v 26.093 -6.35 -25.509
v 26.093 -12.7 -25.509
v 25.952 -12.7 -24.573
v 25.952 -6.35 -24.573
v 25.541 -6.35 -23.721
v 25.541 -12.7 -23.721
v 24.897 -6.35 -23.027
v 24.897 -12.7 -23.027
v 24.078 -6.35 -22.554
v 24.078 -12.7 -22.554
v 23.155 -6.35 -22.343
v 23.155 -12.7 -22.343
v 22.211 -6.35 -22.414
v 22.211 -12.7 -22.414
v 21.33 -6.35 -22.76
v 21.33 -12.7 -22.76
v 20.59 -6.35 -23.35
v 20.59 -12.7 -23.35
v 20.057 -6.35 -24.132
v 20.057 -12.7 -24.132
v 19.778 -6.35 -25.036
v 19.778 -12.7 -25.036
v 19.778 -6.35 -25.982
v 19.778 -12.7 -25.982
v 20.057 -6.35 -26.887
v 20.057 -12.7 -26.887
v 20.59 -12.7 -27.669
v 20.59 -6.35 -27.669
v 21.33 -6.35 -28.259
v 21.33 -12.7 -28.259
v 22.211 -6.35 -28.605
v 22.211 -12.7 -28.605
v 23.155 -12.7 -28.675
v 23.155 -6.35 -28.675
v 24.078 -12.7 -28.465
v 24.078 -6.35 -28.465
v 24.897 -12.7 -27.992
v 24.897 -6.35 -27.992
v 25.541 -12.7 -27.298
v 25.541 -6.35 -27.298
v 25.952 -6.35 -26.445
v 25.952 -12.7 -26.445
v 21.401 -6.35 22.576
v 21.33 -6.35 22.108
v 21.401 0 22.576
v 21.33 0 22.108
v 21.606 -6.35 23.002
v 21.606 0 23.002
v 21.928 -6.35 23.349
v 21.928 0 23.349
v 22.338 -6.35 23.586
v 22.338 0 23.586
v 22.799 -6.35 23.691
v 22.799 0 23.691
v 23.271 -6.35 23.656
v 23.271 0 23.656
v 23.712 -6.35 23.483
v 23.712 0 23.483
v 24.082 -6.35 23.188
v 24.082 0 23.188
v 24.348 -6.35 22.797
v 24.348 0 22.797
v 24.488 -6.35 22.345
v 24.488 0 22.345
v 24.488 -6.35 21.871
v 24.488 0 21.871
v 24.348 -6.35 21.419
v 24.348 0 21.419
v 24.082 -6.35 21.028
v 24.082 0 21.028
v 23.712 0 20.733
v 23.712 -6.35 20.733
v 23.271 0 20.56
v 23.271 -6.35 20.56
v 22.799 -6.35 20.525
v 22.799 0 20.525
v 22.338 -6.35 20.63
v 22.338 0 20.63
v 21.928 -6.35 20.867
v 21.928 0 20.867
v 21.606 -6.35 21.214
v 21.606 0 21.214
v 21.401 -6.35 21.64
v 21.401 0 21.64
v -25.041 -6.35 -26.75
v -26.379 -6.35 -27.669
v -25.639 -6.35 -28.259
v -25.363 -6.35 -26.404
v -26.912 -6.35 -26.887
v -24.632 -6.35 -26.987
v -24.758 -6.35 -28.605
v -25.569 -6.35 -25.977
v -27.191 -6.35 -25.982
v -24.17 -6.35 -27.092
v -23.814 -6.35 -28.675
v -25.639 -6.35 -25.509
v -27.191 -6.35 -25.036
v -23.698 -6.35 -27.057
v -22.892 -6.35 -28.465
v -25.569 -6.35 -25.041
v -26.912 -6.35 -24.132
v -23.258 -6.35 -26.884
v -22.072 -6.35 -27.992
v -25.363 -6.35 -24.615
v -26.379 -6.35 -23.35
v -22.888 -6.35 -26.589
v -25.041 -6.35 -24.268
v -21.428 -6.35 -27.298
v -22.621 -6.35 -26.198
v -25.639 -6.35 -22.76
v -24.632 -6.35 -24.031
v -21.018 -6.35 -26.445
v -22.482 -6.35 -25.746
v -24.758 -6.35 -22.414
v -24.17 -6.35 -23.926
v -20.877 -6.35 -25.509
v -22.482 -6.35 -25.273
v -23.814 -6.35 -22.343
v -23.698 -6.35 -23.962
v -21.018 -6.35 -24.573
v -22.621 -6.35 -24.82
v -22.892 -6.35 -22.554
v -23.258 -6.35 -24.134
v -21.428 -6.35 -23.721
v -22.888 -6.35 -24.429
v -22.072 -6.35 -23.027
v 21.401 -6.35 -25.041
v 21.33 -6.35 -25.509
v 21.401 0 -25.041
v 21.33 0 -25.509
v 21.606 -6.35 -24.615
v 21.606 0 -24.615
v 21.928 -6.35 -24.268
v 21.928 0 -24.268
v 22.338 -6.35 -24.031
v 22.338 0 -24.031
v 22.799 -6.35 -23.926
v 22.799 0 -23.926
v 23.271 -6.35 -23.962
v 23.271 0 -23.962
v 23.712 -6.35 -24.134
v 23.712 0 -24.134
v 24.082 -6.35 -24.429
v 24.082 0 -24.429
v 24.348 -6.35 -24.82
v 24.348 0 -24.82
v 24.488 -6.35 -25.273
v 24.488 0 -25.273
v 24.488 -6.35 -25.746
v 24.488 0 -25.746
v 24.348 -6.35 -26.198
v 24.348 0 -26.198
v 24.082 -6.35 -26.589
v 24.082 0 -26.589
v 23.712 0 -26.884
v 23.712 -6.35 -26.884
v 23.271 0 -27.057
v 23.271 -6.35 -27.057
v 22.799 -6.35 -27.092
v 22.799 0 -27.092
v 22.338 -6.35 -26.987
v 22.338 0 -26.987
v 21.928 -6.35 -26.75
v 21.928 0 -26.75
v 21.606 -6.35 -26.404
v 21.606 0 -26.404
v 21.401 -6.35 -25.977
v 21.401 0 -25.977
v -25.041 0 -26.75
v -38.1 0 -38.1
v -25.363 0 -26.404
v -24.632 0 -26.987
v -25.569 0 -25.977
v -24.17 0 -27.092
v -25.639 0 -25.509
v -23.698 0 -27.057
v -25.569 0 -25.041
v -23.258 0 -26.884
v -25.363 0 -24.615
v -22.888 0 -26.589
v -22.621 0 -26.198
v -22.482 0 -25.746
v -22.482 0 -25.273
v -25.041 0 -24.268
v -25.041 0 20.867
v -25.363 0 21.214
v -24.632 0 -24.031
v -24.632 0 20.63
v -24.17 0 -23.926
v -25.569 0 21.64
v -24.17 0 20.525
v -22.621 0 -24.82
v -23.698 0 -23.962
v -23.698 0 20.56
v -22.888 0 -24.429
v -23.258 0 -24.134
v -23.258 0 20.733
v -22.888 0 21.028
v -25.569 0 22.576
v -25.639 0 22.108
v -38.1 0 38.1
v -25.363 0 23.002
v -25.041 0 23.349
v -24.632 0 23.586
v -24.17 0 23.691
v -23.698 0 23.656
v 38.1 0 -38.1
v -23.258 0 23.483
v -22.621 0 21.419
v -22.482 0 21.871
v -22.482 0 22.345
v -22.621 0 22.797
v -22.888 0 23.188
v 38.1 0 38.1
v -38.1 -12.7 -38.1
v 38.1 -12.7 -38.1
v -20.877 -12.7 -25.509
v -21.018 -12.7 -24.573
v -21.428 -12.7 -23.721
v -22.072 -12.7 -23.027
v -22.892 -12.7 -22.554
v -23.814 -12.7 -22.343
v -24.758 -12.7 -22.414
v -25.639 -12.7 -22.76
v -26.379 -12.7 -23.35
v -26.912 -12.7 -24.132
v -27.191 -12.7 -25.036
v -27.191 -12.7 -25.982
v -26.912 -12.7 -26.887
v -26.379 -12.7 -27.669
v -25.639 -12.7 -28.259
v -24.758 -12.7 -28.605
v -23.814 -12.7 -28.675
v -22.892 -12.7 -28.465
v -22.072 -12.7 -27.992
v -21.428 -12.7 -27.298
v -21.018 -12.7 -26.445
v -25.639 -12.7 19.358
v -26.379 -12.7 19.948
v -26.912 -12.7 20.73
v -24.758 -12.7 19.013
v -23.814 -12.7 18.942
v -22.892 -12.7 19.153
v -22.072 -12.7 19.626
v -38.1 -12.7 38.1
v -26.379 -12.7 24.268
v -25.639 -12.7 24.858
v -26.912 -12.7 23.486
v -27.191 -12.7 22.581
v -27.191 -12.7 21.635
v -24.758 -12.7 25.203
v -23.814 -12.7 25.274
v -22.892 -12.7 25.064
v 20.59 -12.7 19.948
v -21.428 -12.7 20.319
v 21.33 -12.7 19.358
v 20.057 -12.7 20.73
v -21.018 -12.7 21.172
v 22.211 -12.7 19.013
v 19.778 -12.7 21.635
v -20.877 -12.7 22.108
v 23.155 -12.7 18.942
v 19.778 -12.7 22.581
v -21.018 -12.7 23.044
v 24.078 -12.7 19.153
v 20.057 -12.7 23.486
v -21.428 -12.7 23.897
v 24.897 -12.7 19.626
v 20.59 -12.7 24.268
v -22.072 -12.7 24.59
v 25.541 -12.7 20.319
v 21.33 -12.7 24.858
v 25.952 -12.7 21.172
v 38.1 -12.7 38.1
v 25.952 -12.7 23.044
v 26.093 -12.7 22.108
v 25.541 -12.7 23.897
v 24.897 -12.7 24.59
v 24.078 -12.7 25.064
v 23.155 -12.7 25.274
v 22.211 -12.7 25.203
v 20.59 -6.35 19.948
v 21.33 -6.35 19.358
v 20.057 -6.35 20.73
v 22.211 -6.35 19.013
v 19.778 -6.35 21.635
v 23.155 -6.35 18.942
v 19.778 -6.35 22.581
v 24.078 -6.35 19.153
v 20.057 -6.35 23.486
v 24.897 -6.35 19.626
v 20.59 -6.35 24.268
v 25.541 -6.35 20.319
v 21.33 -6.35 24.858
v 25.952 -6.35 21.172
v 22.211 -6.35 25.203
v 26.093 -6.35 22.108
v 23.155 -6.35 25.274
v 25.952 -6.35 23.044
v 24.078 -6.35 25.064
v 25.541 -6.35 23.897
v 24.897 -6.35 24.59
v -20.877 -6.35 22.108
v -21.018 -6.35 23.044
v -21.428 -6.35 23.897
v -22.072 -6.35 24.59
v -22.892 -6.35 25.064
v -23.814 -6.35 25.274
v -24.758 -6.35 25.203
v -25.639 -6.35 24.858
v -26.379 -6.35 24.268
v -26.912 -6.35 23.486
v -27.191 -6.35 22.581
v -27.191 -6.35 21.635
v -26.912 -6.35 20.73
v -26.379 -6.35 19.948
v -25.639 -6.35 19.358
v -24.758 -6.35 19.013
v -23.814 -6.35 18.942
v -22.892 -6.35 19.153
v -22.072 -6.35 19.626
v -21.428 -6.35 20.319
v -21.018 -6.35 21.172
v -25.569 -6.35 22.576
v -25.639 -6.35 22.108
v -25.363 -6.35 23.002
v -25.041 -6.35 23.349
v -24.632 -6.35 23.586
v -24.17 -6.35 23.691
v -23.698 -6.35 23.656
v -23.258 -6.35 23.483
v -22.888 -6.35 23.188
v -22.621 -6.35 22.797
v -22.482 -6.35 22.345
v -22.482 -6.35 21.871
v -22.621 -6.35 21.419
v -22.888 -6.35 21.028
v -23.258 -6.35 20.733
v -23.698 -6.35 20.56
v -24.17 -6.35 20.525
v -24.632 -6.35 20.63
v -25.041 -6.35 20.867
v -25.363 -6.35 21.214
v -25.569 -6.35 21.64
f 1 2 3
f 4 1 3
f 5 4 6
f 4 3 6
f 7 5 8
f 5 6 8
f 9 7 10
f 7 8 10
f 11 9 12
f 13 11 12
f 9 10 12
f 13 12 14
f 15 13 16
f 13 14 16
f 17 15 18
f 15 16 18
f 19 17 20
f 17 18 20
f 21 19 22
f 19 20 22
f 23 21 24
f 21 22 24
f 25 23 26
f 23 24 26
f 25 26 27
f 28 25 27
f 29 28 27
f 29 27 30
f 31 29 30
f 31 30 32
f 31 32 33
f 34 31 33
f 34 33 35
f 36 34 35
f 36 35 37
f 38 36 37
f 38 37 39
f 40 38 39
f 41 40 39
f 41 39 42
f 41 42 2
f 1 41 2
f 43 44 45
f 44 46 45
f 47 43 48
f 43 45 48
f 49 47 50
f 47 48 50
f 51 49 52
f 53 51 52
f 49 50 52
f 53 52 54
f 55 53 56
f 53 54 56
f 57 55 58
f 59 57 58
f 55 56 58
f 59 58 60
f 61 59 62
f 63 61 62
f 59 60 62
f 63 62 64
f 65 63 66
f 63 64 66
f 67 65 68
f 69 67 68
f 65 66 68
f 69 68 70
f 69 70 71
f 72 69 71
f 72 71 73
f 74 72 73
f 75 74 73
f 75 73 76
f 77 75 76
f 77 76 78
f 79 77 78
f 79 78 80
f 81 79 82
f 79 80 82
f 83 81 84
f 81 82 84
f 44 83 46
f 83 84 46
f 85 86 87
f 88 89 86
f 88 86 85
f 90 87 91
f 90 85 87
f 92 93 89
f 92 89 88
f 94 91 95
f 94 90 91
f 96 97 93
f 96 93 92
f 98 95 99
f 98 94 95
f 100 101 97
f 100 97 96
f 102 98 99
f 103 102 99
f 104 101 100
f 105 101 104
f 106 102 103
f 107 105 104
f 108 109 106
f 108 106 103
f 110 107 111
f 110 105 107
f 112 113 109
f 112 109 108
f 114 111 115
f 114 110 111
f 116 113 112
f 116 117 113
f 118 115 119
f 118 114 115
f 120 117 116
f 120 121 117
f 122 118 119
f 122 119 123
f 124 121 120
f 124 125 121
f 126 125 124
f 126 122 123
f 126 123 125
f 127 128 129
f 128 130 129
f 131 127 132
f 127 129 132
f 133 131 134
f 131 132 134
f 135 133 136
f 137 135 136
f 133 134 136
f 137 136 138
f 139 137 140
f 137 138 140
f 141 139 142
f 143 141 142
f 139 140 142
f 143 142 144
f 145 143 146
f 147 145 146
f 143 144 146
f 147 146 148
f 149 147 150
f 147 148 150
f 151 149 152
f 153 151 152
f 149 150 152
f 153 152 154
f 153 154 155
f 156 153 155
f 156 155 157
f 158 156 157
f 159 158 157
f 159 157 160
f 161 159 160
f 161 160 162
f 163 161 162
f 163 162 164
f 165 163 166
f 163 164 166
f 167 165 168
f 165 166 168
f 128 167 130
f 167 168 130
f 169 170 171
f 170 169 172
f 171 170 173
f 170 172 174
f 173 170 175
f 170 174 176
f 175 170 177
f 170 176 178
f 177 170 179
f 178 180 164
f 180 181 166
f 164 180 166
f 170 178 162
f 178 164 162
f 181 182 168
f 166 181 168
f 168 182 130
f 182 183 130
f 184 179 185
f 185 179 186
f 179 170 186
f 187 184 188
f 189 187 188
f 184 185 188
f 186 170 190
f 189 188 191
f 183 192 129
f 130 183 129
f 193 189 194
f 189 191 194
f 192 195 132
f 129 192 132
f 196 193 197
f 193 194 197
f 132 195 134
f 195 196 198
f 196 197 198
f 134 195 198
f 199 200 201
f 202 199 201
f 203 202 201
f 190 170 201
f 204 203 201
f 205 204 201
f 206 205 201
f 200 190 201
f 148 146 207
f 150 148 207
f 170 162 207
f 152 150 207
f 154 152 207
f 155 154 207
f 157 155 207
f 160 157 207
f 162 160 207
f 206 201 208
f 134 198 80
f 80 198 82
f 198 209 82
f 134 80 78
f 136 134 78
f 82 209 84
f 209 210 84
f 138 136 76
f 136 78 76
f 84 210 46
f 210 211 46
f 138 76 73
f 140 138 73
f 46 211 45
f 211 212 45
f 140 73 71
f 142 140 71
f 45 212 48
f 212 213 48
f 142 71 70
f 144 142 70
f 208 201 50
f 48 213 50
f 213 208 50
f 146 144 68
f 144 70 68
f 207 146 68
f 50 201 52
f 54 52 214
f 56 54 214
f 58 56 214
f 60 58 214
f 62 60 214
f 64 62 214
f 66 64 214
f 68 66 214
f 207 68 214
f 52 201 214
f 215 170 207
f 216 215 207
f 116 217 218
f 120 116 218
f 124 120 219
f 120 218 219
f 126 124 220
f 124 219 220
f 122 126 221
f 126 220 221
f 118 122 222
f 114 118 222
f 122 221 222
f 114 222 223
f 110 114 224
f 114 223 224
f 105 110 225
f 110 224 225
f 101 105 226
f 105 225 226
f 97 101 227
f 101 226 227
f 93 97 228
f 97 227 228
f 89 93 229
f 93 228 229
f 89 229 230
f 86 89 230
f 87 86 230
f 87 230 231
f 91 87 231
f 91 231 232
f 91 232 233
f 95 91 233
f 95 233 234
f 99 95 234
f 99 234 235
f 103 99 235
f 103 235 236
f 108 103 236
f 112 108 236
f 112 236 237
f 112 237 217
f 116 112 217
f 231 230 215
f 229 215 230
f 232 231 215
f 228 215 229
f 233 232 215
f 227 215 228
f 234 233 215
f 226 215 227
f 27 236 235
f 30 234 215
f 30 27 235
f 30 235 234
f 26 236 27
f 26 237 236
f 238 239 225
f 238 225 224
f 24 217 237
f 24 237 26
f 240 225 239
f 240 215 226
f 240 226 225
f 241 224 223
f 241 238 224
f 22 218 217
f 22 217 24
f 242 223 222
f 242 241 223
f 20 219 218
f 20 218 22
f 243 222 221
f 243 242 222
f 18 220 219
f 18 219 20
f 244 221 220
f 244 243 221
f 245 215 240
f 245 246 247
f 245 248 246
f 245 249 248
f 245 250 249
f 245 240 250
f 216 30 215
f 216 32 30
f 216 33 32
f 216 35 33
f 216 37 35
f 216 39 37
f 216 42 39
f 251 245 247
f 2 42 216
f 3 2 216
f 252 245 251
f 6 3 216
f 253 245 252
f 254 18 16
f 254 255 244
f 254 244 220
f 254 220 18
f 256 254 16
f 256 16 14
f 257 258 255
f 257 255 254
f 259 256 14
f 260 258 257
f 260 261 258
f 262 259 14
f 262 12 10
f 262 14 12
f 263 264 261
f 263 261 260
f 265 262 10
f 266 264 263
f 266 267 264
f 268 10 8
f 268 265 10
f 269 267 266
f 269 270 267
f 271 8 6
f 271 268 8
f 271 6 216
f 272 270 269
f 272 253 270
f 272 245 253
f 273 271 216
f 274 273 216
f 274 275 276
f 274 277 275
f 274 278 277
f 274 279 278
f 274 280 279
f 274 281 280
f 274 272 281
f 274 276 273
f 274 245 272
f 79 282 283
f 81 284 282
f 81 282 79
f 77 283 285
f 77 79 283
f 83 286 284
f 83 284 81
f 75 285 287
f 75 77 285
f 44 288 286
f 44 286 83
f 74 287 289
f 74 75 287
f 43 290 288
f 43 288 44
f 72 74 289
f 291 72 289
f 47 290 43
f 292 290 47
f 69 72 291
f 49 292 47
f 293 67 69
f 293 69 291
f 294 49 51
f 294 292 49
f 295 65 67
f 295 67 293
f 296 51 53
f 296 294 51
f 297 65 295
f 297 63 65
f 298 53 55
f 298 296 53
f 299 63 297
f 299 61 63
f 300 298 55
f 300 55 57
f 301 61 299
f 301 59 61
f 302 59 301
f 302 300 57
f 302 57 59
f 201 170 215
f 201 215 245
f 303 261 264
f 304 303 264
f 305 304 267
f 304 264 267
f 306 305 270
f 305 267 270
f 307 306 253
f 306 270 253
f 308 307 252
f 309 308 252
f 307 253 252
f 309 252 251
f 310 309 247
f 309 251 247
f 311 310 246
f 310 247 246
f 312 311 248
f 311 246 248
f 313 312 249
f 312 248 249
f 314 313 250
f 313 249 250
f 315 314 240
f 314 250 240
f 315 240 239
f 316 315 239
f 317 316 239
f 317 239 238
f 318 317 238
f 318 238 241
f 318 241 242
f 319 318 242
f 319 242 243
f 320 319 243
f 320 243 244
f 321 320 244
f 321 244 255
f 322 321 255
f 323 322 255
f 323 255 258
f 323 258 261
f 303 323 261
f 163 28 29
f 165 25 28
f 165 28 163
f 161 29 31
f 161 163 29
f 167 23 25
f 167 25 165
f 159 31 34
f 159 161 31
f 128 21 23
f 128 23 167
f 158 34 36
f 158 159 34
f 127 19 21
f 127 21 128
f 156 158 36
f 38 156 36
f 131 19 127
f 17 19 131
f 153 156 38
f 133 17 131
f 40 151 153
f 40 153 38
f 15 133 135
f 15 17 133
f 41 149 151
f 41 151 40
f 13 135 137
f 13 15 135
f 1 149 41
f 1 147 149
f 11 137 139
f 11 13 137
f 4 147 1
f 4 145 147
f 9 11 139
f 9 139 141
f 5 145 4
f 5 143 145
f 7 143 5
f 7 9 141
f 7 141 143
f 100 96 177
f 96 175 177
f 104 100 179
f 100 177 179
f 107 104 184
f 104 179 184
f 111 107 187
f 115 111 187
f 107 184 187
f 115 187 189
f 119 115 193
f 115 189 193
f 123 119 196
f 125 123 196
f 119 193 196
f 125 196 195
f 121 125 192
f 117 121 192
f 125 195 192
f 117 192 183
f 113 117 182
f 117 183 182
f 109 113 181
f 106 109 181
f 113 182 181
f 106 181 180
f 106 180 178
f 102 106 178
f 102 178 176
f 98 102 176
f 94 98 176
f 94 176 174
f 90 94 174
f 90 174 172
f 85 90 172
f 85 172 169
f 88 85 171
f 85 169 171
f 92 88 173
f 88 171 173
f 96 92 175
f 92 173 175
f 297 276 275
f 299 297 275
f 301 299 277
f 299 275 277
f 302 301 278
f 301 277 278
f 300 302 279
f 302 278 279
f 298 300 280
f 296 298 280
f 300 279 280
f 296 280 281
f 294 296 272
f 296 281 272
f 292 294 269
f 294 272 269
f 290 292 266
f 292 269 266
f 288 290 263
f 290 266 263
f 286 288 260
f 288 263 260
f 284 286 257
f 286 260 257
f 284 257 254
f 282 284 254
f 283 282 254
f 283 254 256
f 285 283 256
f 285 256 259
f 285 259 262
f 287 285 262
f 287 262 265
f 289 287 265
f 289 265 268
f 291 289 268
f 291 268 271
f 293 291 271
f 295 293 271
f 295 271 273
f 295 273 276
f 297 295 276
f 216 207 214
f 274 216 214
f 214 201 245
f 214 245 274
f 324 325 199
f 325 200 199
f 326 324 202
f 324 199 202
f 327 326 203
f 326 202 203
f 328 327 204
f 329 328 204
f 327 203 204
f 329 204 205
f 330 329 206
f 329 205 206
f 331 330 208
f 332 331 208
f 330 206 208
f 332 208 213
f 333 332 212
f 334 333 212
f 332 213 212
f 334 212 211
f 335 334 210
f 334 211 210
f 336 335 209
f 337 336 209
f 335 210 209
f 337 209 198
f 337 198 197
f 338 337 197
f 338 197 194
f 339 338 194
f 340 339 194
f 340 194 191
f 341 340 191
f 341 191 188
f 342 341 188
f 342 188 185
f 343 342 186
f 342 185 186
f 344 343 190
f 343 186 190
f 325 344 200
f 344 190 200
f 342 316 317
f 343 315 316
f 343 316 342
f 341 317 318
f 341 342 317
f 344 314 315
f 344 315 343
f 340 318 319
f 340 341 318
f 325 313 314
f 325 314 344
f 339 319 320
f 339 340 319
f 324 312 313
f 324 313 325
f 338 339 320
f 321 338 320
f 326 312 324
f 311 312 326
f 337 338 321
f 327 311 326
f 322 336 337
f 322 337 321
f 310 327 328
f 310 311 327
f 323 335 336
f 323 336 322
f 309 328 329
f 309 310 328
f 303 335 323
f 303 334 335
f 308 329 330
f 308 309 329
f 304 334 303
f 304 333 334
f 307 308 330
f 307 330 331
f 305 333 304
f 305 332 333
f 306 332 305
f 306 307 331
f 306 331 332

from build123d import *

# Parameters (mm, degrees)
F0_W           = 76.2
F0_H           = 76.2
F1_DEPTH       = 12.7
F3_D           = 3.175
F3_CBORE_D     = 6.35
F3_CBORE_DEPTH = 6.35


with BuildPart() as f1:
    # F0 (on Front) → F1 (new body)
    with BuildSketch(Plane.XZ):
        Rectangle(F0_W, F0_H)
    extrude(amount=F1_DEPTH)

    # F3 (through all)
    with Locations(Plane.XZ.offset(12.7)):
        with Locations((-24.05159, 22.108026), (22.917846, 22.108026), (22.917846, -25.509261), (-24.05159, -25.509261)):
            CounterBoreHole(F3_D / 2, F3_CBORE_D / 2, F3_CBORE_DEPTH)


solid = f1.part
